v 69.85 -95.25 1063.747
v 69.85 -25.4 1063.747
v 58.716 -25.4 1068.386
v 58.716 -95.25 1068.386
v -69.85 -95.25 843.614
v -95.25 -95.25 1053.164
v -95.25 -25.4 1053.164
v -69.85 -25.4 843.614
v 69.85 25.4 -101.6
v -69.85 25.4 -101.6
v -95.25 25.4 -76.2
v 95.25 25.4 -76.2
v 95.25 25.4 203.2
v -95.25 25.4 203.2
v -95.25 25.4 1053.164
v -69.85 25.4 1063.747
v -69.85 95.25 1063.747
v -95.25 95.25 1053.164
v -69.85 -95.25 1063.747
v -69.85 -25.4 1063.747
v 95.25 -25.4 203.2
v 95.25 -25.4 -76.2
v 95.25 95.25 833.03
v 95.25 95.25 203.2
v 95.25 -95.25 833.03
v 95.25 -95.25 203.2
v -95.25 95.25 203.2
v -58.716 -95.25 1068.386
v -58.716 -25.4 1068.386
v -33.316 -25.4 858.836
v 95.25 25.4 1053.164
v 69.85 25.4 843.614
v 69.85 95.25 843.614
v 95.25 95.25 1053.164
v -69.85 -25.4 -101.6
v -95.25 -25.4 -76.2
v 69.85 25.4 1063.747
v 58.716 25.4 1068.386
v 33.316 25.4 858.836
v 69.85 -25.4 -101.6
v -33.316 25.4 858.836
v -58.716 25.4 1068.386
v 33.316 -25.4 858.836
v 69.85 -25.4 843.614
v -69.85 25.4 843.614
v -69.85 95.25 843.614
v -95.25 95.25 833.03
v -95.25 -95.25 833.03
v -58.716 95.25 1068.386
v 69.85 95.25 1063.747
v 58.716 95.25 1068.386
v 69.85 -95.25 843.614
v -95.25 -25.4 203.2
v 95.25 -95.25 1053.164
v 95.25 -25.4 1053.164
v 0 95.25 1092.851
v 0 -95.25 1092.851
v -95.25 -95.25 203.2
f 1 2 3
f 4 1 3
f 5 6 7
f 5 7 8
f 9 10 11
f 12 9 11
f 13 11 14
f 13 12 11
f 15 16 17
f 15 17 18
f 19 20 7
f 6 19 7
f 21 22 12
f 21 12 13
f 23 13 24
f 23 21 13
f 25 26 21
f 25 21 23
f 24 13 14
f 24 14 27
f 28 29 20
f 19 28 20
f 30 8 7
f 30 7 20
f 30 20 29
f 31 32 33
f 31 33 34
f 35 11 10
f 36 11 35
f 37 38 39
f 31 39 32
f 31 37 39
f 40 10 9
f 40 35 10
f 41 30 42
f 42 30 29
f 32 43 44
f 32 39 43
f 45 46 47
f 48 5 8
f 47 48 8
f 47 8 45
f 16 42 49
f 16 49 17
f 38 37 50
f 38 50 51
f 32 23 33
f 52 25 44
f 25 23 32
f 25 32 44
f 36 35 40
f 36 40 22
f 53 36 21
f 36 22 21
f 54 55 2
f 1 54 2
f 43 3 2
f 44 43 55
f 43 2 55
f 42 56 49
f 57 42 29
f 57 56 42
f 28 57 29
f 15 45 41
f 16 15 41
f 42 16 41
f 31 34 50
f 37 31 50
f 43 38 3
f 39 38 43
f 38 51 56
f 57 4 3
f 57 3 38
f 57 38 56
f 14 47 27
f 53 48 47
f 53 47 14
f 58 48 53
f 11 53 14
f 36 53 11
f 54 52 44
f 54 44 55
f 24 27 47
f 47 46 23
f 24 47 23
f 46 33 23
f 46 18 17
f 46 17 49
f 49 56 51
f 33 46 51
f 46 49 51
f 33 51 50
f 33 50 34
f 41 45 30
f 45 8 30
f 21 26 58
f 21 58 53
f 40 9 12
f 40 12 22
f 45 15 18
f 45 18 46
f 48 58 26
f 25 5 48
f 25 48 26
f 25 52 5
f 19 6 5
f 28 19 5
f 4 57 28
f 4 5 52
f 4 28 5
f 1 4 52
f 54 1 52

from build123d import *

# Parameters (mm, degrees)
F0_W          = 95.25
F0_H          = 101.6
F1_DEPTH      = 95.25
F2_W          = 69.85
F2_H          = 304.8
F3_DEPTH      = 95.251
F3_DEPTH_BACK = 95.251
F5_SIZE       = 25.4
F6_SIZE       = 25.4
F8_DEPTH      = 25.4


with BuildPart() as f1:
    # F0 (on Front) → F1 (new body, symmetric)
    with BuildSketch(Plane.XZ):
        with Locations((47.625, -50.8)):
            Rectangle(F0_W, F0_H)
        with Locations((-47.625, -50.8)):
            Rectangle(F0_W, F0_H)
        Polygon((95.25, 203.2), (-95.25, 203.2), (-95.25, 0), (0, 0), (95.25, 0), align=None)
        Polygon((33.3162687146, 858.8361700868), (0, 872.7179487179), (-33.3162687146, 858.8361700868), (-69.85, 843.6137820513), (-95.25, 833.0304487179), (-95.25, 203.2), (95.25, 203.2), (95.25, 833.0304487179), (69.85, 843.6137820513), align=None)
        Polygon((0, 872.7179487179), (0, 1092.8512820513), (-58.7162687146, 1068.3861700868), (-33.3162687146, 858.8361700868), align=None)
        Polygon((58.7162687146, 1068.3861700868), (0, 1092.8512820513), (0, 872.7179487179), (33.3162687146, 858.8361700868), align=None)
        Polygon((-33.3162687146, 858.8361700868), (-58.7162687146, 1068.3861700868), (-69.85, 1063.7471153846), (-69.85, 843.6137820513), align=None)
        Polygon((69.85, 1063.7471153846), (58.7162687146, 1068.3861700868), (33.3162687146, 858.8361700868), (69.85, 843.6137820513), align=None)
        Polygon((-69.85, 1063.7471153846), (-95.25, 1053.1637820513), (-69.85, 843.6137820513), align=None)
        Polygon((69.85, 843.6137820513), (95.25, 1053.1637820513), (69.85, 1063.7471153846), align=None)
    extrude(amount=F1_DEPTH, both=True)

    # F2 (on Right) → F3 (cut, two sides)
    with BuildSketch(Plane.YZ) as f3_sk:
        with Locations((-60.325, 50.8)):
            Rectangle(F2_W, F2_H)
        with Locations((60.325, 50.8)):
            Rectangle(F2_W, F2_H)
    extrude(amount=-F3_DEPTH, mode=Mode.SUBTRACT)
    extrude(f3_sk.sketch, amount=F3_DEPTH_BACK, mode=Mode.SUBTRACT)

    # F5
    f5_edges = [f1.edges().sort_by_distance(p)[0] for p in [
        (95.25, 0, -101.6),
    ]]
    chamfer(f5_edges, length=F5_SIZE)

    # F6
    f6_edges = [f1.edges().sort_by_distance(p)[0] for p in [
        (-95.25, 0, -101.6),
    ]]
    chamfer(f6_edges, length=F6_SIZE)

    # F7 (on Front) → F8 (cut, symmetric)
    with BuildSketch(Plane.XZ):
        Polygon((58.7162687146, 1068.3861700868), (33.3162687146, 858.8361700868), (69.85, 843.6137820513), (95.25, 1053.1637820513), align=None)
        Polygon((-33.3162687146, 858.8361700868), (-58.7162687146, 1068.3861700868), (-95.25, 1053.1637820513), (-69.85, 843.6137820513), align=None)
    extrude(amount=F8_DEPTH, both=True, mode=Mode.SUBTRACT)


solid = f1.part
